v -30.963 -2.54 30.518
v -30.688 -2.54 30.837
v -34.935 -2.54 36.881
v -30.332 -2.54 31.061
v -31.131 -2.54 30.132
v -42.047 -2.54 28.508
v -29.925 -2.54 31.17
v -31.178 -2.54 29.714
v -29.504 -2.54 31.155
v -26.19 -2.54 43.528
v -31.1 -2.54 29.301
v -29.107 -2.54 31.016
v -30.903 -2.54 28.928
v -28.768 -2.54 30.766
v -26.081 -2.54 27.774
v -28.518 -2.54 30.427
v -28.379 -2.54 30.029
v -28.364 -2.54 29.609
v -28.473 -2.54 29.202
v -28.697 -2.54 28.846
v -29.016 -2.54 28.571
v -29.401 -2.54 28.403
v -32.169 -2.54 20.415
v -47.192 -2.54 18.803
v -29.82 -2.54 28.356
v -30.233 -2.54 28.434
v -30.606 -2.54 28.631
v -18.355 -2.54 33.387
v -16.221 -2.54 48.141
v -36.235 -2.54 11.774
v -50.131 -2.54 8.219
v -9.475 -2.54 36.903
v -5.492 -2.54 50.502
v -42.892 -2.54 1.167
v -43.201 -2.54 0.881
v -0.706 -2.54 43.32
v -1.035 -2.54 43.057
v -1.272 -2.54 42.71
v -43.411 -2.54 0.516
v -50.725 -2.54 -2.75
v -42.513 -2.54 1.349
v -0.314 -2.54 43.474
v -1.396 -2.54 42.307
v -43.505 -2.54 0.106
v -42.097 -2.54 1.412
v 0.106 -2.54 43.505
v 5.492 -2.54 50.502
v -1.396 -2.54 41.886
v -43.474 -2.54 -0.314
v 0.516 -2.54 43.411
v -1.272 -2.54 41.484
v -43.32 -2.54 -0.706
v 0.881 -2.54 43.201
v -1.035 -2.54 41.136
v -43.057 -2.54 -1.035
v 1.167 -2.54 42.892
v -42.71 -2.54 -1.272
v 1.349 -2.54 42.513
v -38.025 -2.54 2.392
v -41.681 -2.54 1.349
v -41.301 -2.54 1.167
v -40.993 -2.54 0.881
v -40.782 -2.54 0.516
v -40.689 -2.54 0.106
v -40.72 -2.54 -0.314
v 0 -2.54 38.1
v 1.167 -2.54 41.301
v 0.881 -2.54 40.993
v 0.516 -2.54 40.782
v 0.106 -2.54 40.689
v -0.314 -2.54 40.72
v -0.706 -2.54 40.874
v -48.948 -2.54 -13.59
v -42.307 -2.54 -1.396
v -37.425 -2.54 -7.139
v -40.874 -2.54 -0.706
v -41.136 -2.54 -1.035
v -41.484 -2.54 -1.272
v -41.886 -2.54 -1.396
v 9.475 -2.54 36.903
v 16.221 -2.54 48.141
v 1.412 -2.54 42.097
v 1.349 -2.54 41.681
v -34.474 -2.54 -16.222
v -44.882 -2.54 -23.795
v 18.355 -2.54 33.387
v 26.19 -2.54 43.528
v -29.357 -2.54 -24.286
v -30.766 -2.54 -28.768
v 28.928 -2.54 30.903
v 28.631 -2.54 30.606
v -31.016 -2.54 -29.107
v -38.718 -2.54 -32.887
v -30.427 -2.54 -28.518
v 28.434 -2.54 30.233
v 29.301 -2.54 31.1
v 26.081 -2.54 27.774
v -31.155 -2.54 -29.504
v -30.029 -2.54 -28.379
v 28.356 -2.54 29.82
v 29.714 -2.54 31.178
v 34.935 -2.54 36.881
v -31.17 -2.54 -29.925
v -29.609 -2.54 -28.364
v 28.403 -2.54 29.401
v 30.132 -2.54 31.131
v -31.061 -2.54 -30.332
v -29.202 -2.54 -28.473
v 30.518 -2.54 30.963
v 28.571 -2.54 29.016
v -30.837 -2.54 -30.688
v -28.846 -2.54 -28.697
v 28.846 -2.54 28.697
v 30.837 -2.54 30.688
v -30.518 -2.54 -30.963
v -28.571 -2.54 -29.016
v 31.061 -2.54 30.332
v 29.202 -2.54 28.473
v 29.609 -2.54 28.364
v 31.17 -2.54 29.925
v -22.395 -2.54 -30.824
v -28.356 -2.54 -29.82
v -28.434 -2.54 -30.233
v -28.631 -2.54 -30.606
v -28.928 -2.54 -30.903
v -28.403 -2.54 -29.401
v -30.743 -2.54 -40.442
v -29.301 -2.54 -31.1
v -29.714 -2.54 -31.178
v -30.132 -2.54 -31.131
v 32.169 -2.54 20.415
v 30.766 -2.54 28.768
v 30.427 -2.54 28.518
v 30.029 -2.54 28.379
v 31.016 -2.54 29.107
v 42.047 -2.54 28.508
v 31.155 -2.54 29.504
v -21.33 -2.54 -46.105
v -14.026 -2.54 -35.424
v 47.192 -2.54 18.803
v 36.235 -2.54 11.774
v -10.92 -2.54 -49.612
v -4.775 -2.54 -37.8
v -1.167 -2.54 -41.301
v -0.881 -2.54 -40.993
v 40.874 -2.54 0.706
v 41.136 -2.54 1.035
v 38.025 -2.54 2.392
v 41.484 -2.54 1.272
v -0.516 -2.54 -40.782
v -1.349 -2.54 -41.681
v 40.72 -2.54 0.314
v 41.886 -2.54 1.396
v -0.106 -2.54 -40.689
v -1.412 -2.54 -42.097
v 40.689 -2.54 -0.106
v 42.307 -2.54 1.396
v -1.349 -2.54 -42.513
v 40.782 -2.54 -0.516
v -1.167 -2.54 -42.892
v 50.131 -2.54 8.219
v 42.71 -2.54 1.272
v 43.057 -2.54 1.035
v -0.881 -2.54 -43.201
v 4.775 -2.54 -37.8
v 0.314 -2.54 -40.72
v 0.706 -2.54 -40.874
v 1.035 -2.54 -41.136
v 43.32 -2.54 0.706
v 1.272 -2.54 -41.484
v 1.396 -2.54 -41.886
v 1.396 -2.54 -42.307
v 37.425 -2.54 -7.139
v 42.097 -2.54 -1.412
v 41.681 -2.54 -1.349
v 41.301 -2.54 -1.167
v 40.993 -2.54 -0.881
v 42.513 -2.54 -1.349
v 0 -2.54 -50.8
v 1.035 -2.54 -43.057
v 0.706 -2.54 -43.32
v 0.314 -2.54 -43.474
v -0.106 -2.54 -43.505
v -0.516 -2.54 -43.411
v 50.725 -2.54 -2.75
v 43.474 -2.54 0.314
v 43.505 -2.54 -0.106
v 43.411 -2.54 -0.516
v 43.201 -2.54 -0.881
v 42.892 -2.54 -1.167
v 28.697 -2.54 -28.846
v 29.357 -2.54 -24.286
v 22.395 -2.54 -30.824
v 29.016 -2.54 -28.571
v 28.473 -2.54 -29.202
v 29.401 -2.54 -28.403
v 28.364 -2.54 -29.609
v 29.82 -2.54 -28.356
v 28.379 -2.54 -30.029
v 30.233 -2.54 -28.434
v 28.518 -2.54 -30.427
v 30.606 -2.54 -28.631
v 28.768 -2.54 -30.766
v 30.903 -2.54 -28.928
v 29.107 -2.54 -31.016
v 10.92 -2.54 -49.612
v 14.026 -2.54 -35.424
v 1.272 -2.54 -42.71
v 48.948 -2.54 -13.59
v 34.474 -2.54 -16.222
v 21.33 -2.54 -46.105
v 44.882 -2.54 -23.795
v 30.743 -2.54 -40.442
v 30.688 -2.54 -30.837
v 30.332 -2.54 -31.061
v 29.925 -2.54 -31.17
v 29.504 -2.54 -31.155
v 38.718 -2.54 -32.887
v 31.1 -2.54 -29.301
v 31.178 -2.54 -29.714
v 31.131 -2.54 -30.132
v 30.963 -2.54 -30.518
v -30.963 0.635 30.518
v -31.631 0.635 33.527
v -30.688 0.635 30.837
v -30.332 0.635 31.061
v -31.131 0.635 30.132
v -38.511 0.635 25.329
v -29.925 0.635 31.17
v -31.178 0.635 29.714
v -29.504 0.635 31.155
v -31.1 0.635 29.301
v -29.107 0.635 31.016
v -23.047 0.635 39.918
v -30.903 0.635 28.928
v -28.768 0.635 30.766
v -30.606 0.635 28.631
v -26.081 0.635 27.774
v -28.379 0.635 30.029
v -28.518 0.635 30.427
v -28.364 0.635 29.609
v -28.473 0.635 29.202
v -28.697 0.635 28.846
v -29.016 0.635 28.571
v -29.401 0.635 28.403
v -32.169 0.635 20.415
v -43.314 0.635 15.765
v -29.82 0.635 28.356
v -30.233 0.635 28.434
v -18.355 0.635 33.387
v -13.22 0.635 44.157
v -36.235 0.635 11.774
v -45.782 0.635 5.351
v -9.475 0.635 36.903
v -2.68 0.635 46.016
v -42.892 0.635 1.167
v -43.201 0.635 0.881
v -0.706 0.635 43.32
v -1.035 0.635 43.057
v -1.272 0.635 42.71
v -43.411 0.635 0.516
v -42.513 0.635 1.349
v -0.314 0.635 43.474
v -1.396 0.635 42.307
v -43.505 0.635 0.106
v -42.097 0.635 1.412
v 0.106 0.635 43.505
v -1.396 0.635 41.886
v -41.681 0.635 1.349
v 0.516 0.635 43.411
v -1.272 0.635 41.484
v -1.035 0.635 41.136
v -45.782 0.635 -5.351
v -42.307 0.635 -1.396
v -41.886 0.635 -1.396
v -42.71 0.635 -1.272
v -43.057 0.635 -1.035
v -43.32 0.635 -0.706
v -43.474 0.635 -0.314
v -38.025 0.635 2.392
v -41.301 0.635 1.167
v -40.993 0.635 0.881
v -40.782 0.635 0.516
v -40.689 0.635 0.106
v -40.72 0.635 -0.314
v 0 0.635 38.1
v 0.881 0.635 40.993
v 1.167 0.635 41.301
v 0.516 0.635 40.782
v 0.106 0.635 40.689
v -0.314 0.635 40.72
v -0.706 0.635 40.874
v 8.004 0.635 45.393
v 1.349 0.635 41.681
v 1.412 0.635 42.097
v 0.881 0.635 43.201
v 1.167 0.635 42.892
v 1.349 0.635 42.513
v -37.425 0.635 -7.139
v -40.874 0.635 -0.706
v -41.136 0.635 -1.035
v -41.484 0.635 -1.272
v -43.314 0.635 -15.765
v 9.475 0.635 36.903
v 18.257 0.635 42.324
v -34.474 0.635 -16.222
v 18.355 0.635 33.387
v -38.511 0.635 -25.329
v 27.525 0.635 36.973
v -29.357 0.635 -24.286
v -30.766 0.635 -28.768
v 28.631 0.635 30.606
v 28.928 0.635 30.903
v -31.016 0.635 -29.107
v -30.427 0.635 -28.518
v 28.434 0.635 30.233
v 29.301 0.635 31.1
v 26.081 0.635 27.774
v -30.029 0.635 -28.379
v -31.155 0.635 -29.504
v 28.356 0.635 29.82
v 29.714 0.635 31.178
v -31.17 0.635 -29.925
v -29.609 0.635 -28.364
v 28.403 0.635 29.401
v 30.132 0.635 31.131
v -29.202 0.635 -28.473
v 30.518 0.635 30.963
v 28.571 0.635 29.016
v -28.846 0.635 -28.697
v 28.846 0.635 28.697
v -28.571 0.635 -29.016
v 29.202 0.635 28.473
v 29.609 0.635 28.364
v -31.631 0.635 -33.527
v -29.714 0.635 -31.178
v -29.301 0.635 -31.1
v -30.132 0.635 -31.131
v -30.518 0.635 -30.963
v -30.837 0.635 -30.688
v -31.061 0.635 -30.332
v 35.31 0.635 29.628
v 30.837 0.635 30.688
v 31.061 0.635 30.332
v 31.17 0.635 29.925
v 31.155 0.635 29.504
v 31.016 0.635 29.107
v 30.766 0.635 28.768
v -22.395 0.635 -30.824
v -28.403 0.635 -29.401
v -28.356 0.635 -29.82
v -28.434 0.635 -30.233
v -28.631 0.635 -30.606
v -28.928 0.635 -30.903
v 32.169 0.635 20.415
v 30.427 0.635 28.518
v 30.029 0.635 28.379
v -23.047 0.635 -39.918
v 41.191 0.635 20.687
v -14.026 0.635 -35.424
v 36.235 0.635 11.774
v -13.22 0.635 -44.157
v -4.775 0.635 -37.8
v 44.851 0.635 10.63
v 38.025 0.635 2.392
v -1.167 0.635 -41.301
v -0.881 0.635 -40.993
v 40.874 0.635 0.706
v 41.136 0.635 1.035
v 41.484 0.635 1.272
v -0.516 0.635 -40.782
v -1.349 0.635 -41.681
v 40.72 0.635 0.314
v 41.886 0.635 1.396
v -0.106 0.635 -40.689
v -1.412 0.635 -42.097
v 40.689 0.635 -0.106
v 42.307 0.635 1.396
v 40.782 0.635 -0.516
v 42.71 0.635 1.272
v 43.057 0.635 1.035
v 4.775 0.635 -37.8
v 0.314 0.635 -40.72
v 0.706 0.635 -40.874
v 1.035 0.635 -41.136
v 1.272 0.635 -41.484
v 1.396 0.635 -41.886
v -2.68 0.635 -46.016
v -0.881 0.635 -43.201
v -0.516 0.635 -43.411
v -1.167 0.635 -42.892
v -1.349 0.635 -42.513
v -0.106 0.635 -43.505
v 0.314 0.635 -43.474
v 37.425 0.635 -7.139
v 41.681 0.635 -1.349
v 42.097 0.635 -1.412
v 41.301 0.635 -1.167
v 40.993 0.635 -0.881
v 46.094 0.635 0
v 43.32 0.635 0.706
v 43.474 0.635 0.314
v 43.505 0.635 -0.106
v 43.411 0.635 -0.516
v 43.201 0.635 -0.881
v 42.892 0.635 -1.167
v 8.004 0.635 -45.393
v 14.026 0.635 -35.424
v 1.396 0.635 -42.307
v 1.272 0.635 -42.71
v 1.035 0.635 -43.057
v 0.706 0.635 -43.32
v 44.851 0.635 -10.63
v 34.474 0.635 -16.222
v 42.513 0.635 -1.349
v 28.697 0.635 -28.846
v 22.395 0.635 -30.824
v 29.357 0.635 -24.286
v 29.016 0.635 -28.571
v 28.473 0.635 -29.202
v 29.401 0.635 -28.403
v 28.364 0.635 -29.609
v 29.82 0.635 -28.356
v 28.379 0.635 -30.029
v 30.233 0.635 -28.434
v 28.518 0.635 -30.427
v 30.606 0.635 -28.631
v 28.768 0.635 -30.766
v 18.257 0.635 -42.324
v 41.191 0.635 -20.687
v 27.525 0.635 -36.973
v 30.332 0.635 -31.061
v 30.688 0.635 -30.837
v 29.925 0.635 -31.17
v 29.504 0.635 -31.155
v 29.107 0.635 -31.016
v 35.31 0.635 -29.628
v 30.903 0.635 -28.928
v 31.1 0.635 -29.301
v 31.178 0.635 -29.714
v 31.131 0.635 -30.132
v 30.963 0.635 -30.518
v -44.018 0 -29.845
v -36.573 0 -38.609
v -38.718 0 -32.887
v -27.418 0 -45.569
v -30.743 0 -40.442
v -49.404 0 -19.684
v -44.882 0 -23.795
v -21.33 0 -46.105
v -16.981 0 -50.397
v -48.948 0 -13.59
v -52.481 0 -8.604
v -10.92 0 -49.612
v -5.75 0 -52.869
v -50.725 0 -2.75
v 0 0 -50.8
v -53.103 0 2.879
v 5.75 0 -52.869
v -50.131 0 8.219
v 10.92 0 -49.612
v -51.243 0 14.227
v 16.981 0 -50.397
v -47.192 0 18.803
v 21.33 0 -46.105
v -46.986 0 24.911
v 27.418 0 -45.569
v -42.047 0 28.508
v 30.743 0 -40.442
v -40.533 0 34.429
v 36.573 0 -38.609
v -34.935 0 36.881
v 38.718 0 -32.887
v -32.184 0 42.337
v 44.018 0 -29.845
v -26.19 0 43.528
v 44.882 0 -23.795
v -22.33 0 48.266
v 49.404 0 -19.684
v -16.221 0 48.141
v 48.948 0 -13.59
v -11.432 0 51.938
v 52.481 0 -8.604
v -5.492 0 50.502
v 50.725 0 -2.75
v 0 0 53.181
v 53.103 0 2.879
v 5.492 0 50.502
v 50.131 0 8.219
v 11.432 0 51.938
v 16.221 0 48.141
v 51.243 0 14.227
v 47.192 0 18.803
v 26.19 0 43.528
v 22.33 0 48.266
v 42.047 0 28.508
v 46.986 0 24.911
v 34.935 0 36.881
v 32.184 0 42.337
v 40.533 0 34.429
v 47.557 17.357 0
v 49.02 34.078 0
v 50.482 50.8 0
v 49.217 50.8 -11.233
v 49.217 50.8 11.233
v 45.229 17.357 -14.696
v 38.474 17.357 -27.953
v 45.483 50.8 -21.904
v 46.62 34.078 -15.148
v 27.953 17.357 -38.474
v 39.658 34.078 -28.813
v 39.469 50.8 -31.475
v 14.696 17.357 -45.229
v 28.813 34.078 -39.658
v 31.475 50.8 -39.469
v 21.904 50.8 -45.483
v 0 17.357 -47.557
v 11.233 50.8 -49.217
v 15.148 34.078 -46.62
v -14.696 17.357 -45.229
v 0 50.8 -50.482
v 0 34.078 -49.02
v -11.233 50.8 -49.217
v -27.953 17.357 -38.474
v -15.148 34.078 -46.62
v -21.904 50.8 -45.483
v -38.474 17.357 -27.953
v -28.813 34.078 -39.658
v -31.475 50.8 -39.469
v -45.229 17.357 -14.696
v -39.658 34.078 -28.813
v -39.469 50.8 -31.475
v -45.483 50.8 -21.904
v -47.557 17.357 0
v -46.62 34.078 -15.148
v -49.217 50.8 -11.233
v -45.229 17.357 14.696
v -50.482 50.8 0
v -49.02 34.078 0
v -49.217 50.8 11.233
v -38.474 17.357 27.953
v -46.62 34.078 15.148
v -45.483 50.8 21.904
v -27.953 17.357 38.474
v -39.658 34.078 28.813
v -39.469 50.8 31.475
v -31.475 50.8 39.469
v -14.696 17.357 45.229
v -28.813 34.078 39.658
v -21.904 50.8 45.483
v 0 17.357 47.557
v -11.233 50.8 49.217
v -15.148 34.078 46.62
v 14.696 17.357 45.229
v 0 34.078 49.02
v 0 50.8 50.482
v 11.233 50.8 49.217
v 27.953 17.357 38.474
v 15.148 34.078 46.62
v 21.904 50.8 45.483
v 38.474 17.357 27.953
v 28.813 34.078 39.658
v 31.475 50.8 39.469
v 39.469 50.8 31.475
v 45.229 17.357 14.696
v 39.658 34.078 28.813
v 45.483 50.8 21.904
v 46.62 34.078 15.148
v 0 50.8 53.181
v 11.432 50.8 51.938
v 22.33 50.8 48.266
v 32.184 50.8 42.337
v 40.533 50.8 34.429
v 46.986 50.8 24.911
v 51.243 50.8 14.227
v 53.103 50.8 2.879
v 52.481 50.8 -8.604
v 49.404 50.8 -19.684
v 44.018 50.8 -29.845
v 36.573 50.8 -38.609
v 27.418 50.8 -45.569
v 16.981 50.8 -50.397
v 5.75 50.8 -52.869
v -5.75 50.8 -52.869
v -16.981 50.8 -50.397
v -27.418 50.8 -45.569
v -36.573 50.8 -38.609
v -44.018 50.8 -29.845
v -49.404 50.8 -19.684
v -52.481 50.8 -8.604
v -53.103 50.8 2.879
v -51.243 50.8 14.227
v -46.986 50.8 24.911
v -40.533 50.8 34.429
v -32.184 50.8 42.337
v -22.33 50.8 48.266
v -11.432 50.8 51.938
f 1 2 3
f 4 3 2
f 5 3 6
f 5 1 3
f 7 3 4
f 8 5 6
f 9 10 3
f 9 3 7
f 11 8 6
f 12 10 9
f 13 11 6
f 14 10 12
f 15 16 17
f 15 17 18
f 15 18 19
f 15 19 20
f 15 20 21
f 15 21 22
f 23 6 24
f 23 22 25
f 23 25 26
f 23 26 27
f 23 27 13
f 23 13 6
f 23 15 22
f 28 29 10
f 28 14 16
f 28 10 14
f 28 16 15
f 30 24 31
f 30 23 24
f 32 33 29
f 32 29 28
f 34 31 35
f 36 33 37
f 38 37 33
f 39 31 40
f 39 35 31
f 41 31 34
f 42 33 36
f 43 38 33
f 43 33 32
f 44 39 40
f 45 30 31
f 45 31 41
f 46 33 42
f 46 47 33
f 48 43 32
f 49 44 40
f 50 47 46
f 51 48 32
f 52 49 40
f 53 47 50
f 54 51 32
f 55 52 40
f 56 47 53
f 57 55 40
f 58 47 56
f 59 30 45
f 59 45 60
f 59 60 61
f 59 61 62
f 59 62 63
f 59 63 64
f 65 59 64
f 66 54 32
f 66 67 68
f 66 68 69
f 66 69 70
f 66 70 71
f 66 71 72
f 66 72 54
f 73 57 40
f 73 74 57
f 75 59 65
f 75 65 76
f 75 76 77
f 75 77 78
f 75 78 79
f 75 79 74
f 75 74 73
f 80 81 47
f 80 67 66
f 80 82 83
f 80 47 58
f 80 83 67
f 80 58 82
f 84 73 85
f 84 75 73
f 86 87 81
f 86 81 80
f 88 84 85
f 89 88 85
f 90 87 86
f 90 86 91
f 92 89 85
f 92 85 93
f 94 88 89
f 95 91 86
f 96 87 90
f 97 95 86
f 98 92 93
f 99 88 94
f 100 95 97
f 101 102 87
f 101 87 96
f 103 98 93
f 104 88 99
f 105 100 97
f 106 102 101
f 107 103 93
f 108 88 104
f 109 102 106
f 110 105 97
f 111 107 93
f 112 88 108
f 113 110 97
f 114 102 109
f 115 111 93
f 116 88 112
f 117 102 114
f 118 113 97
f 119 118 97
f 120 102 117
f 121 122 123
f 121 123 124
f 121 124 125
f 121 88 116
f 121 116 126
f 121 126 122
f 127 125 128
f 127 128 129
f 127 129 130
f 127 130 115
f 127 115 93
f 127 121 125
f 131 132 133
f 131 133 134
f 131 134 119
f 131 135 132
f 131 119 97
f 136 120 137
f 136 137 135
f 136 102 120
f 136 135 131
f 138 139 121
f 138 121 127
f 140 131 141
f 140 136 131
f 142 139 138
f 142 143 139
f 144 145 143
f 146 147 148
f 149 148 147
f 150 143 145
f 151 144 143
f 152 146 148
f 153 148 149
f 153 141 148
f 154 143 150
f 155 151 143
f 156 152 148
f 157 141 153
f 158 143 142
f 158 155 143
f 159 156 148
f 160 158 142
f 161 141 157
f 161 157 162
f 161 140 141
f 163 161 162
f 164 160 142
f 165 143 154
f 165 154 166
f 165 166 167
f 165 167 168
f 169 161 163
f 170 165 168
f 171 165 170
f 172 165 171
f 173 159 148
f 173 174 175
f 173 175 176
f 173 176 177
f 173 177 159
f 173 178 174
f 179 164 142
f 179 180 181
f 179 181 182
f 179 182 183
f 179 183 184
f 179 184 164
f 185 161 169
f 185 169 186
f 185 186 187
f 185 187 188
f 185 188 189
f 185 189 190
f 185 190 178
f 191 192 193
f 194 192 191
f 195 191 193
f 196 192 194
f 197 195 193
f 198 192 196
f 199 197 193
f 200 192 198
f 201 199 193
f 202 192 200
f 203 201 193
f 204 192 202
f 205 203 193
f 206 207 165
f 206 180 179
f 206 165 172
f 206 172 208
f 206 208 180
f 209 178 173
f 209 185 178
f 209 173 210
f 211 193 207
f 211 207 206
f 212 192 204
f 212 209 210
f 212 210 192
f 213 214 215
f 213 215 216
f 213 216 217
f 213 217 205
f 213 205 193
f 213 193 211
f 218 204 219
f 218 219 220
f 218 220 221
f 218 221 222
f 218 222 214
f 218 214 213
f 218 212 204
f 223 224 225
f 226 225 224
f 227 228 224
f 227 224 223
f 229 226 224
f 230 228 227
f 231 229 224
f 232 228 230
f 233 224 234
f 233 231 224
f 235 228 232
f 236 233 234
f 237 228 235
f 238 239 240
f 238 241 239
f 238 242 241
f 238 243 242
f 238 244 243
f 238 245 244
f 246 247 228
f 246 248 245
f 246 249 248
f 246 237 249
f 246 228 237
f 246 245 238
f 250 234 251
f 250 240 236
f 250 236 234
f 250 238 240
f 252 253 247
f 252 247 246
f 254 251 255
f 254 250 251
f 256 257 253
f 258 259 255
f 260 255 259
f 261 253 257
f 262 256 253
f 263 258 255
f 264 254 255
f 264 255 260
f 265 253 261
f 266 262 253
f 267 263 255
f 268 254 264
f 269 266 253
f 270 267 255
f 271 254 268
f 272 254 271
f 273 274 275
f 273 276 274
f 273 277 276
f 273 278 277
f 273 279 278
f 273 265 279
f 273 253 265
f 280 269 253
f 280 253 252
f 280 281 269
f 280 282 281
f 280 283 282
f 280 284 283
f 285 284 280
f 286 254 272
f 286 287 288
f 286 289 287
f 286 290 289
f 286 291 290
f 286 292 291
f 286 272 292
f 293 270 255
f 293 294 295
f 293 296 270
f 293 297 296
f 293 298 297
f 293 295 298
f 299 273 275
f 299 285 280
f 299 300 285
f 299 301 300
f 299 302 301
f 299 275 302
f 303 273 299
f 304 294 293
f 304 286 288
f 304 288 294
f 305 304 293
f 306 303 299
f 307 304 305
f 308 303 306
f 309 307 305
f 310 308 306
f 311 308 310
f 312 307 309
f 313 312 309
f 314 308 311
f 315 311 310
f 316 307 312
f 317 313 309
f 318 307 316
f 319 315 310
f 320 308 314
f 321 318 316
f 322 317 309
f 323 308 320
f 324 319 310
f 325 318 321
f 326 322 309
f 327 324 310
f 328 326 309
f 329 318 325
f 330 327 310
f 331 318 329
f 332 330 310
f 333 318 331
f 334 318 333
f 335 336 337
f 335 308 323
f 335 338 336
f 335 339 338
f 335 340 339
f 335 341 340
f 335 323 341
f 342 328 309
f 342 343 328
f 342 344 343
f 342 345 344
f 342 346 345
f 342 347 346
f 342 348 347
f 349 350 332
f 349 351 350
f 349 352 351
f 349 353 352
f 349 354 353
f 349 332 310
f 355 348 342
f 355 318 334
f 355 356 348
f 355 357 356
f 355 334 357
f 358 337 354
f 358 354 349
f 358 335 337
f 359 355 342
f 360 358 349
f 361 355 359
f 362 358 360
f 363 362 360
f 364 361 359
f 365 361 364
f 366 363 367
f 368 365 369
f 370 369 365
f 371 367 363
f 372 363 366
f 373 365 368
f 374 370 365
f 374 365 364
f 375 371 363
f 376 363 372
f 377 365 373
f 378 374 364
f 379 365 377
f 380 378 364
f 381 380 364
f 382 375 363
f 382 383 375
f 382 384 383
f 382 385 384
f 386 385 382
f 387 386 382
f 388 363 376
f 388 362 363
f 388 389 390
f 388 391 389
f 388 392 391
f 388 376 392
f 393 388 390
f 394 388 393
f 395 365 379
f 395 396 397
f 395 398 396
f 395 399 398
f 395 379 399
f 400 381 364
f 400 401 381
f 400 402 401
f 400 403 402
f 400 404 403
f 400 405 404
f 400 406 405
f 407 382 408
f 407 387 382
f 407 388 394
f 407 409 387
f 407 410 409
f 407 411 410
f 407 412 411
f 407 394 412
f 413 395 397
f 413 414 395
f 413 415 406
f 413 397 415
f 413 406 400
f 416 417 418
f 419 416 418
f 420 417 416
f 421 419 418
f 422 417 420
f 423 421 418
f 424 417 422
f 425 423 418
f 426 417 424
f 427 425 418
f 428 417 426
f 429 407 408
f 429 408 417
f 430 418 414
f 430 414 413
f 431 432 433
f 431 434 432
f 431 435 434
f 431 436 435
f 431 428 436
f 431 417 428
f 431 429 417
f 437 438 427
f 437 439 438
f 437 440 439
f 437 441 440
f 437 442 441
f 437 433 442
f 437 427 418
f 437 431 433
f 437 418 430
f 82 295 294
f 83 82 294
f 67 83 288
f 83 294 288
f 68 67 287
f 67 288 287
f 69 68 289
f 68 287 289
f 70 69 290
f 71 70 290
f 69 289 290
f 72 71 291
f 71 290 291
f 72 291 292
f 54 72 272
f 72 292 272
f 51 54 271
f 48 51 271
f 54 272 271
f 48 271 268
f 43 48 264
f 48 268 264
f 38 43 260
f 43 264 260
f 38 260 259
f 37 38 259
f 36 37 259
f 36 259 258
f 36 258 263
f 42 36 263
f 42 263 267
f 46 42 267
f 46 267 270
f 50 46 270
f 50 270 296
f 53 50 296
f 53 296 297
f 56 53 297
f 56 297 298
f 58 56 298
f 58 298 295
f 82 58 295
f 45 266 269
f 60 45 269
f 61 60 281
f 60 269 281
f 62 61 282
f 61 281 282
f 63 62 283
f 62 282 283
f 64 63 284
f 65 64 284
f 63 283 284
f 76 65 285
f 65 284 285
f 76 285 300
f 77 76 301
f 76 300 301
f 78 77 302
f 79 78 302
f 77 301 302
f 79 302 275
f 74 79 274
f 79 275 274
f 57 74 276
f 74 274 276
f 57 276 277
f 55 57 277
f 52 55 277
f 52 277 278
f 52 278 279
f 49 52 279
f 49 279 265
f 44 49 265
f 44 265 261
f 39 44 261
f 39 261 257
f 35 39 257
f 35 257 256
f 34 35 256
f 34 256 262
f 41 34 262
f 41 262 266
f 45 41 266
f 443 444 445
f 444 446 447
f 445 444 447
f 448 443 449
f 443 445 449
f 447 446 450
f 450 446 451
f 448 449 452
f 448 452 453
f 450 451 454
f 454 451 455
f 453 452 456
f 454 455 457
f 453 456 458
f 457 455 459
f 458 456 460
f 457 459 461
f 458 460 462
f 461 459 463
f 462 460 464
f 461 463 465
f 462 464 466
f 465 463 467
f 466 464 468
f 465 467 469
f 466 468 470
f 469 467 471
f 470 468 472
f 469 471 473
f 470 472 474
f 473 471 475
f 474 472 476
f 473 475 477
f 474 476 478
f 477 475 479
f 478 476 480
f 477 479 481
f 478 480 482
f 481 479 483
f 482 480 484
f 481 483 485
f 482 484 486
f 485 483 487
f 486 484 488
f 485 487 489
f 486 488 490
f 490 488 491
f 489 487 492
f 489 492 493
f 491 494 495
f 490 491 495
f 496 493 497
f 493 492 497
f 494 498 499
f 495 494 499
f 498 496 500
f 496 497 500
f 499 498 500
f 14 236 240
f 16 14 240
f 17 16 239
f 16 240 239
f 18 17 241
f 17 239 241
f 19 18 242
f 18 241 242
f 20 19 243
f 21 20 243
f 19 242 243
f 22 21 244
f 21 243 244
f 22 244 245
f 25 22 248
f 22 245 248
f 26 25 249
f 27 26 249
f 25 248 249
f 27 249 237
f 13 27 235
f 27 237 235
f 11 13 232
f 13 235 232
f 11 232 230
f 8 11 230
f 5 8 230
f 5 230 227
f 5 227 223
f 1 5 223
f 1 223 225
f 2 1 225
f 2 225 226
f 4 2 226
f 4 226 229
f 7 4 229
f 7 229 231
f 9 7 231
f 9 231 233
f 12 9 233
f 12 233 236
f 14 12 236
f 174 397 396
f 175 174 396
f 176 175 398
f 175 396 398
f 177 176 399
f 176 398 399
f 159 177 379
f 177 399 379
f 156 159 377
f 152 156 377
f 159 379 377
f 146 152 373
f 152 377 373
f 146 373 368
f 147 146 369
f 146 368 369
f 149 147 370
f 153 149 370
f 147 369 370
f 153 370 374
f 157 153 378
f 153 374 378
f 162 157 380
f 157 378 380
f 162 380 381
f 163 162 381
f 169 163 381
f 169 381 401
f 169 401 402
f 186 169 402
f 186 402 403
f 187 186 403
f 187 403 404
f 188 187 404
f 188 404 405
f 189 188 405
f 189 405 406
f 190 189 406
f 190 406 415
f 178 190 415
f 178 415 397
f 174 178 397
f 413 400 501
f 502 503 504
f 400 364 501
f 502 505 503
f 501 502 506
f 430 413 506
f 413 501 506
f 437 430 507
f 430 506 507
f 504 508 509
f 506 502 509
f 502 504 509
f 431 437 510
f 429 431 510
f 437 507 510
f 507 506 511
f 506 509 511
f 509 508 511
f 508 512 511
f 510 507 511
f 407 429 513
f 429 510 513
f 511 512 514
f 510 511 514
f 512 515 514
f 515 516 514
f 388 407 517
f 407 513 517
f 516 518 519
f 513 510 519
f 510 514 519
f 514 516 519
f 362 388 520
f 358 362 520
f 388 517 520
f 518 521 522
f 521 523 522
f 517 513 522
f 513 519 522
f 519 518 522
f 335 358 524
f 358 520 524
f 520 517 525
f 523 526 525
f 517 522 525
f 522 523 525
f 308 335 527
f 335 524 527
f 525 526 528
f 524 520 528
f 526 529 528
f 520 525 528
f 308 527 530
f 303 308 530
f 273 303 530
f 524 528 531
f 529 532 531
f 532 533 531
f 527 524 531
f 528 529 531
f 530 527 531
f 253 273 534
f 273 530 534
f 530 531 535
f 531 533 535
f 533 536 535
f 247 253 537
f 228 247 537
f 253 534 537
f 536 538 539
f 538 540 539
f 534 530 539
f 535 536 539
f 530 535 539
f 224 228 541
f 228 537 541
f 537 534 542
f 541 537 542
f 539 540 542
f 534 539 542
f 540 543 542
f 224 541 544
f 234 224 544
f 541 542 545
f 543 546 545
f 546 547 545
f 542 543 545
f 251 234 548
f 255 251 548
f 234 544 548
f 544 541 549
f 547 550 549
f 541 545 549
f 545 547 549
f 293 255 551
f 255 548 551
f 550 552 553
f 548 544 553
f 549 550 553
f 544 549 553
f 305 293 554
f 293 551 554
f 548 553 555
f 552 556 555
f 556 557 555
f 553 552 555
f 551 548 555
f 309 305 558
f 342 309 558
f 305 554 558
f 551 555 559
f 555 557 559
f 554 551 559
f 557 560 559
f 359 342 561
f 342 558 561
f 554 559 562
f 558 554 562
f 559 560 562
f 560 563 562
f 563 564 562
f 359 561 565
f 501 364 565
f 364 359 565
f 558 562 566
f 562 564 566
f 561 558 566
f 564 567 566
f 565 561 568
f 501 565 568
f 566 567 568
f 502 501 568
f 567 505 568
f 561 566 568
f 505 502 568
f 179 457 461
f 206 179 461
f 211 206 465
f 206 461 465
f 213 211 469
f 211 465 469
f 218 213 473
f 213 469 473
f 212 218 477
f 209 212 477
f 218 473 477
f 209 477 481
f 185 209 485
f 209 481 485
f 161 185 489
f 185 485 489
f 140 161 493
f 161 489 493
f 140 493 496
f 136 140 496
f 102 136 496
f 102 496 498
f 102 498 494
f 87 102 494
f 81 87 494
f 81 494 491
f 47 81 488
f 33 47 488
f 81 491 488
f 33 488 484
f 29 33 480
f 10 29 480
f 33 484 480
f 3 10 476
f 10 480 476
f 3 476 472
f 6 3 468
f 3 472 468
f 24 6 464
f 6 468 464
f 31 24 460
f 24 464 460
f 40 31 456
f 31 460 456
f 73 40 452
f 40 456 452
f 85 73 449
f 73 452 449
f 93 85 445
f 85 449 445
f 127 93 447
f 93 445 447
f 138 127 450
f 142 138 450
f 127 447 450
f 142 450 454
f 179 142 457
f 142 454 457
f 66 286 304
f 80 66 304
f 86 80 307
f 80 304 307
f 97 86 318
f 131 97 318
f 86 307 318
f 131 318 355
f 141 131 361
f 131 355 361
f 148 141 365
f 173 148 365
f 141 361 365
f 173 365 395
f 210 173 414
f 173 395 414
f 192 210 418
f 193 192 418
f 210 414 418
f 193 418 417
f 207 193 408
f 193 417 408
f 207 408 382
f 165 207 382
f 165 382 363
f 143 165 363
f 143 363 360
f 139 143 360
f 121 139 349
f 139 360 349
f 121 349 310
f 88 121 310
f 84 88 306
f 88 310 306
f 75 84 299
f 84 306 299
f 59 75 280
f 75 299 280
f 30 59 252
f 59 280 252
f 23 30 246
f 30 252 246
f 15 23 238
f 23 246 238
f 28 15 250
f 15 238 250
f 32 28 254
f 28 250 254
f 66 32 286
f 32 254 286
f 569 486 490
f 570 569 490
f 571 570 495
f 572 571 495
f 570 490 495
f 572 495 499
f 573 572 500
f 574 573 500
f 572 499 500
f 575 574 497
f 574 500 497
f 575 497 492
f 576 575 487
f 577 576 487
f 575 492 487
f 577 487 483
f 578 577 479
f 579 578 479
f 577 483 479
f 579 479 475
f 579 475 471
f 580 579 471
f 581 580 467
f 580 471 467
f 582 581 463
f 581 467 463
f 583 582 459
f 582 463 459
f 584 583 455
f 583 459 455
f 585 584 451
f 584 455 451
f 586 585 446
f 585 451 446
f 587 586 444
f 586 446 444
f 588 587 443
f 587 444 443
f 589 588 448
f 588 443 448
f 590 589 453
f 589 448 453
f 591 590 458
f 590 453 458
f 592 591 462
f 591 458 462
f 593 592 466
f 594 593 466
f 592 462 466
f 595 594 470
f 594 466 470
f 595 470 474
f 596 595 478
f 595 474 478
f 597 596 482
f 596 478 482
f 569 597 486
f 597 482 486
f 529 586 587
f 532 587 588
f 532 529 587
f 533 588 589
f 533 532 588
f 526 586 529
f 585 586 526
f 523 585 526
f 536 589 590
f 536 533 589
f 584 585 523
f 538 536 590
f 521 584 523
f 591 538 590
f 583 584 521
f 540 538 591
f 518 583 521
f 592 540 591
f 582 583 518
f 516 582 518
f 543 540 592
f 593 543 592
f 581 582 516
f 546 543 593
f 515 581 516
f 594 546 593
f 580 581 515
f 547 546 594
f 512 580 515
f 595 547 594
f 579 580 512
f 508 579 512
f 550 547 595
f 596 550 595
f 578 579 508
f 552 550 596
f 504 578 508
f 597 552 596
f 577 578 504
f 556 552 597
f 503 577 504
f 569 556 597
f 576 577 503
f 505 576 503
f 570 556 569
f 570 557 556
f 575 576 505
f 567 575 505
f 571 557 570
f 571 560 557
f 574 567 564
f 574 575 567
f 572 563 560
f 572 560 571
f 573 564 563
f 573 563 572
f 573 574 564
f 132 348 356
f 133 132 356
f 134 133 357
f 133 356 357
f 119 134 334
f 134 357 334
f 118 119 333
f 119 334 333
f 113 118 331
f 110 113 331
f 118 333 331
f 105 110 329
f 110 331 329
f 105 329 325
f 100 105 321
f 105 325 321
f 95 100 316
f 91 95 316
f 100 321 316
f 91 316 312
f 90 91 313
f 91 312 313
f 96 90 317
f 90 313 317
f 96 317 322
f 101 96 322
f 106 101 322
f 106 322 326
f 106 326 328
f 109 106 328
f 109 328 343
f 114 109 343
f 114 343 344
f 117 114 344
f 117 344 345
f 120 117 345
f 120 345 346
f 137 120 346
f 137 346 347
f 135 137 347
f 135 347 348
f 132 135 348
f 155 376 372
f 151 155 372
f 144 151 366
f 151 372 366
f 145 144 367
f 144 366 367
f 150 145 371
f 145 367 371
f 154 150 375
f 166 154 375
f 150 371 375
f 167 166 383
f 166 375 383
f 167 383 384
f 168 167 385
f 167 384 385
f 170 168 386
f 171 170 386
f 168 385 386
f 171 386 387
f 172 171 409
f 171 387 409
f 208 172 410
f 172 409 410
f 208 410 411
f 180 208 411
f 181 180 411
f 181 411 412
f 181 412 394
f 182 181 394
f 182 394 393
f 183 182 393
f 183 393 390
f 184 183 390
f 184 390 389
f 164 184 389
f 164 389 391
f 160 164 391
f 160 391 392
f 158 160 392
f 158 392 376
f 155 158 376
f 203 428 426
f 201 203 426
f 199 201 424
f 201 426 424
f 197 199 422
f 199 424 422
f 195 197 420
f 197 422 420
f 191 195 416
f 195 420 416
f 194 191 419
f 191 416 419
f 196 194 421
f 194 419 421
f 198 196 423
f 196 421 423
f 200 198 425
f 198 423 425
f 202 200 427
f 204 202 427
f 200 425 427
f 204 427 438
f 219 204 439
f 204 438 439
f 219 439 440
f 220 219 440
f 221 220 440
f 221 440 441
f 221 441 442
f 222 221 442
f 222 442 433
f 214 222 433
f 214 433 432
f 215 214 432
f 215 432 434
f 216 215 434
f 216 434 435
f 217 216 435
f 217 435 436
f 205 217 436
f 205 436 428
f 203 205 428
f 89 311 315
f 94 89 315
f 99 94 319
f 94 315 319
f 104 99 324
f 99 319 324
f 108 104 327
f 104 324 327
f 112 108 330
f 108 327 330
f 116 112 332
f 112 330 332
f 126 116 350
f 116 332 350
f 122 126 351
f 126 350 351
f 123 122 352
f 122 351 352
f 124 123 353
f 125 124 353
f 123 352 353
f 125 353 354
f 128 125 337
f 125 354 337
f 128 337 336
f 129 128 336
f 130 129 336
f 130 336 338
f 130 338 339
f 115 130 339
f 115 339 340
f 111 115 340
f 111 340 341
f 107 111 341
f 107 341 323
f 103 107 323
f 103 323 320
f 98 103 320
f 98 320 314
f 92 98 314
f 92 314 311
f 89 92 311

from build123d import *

# Parameters (mm, degrees)
SKETCH1_R           = 53.18125
BOSS_EXTRUDE1_DEPTH = 50.8
SKETCH2_R           = 50.8
SKETCH2_R_2         = 50.4825
BOSS_EXTRUDE2_DEPTH = 2.54
SKETCH3_R           = 50.4825
CUT_EXTRUDE1_DEPTH  = 50.165
CUT_EXTRUDE1_DRAFT  = -5
SKETCH4_R           = 38.1
CUT_EXTRUDE3_DEPTH  = 3.175
SKETCH5_R           = 1.41224
CUT_EXTRUDE4_DEPTH  = 91.404745053
CIRPATTERN4_COUNT   = 8


with BuildPart() as part:
    # Sketch1 → Boss-Extrude1 (new body)
    with BuildSketch(Plane(origin=(0, 0, 0), x_dir=(1, 0, 0), z_dir=(0, 1, 0))):
        with Locations(Location((0, 0, 0), (0, 0, 270))):
            Circle(SKETCH1_R)
    extrude(amount=BOSS_EXTRUDE1_DEPTH)

    # Sketch2 → Boss-Extrude2 (add)
    with BuildSketch(Plane.XZ):
        with Locations(Location((0, 0, 0), (0, 0, 270))):
            Circle(SKETCH2_R)
        Circle(SKETCH2_R_2, mode=Mode.SUBTRACT)
        Circle(SKETCH2_R_2)
    extrude(amount=BOSS_EXTRUDE2_DEPTH)


with BuildPart() as cut_extrude1_tool:
    # Sketch3 → Cut-Extrude1 (with draft: the straight prism first)
    with BuildSketch(Plane(origin=(0, 50.8, 0), x_dir=(1, 0, 0), z_dir=(0, 1, 0))):
        Circle(SKETCH3_R)
    extrude(amount=-CUT_EXTRUDE1_DEPTH)
    # Cut-Extrude1: the draft: its side faces are tilted about the plane it starts from
    cut_extrude1_sides = [cut_extrude1_tool.faces().sort_by_distance(p)[0] for p in [
        (-50.4825, 25.7175, 0),
    ]]
    draft(cut_extrude1_sides, Plane(origin=(0, 50.8, 0), x_dir=(1, 0, 0), z_dir=(0, 1, 0)), CUT_EXTRUDE1_DRAFT)


with BuildPart() as part_1:
    add(part.part)

    # Cut-Extrude1: cut by cut_extrude1_tool
    add(cut_extrude1_tool.part, mode=Mode.SUBTRACT)

    # Sketch4 → Cut-Extrude3 (cut)
    with BuildSketch(Plane(origin=(0, 0.635, 0), x_dir=(1, 0, 0), z_dir=(0, 1, 0))):
        with Locations(Location((0, 0, 0), (0, 0, 270))):
            Circle(SKETCH4_R)
    extrude(amount=-CUT_EXTRUDE3_DEPTH, mode=Mode.SUBTRACT)

    # Sketch5 → Cut-Extrude4 (cut, through all)
    with BuildSketch(Plane(origin=(0, 0.635, 0), x_dir=(1, 0, 0), z_dir=(0, 1, 0))):
        with Locations(Location((-42.096815597, 0, 0), (0, 0, 270))):
            Circle(SKETCH5_R)
    cut_extrude4 = extrude(amount=-CUT_EXTRUDE4_DEPTH, mode=Mode.SUBTRACT)

    # CirPattern4: Cut-Extrude4 ×8 about axis
    cirpattern4_axis = Axis((0, 0, 0), (0, 1, 0))
    for i in range(1, CIRPATTERN4_COUNT):
        add(cut_extrude4.rotate(cirpattern4_axis, i * 360 / CIRPATTERN4_COUNT), mode=Mode.SUBTRACT)


solid = part_1.part
